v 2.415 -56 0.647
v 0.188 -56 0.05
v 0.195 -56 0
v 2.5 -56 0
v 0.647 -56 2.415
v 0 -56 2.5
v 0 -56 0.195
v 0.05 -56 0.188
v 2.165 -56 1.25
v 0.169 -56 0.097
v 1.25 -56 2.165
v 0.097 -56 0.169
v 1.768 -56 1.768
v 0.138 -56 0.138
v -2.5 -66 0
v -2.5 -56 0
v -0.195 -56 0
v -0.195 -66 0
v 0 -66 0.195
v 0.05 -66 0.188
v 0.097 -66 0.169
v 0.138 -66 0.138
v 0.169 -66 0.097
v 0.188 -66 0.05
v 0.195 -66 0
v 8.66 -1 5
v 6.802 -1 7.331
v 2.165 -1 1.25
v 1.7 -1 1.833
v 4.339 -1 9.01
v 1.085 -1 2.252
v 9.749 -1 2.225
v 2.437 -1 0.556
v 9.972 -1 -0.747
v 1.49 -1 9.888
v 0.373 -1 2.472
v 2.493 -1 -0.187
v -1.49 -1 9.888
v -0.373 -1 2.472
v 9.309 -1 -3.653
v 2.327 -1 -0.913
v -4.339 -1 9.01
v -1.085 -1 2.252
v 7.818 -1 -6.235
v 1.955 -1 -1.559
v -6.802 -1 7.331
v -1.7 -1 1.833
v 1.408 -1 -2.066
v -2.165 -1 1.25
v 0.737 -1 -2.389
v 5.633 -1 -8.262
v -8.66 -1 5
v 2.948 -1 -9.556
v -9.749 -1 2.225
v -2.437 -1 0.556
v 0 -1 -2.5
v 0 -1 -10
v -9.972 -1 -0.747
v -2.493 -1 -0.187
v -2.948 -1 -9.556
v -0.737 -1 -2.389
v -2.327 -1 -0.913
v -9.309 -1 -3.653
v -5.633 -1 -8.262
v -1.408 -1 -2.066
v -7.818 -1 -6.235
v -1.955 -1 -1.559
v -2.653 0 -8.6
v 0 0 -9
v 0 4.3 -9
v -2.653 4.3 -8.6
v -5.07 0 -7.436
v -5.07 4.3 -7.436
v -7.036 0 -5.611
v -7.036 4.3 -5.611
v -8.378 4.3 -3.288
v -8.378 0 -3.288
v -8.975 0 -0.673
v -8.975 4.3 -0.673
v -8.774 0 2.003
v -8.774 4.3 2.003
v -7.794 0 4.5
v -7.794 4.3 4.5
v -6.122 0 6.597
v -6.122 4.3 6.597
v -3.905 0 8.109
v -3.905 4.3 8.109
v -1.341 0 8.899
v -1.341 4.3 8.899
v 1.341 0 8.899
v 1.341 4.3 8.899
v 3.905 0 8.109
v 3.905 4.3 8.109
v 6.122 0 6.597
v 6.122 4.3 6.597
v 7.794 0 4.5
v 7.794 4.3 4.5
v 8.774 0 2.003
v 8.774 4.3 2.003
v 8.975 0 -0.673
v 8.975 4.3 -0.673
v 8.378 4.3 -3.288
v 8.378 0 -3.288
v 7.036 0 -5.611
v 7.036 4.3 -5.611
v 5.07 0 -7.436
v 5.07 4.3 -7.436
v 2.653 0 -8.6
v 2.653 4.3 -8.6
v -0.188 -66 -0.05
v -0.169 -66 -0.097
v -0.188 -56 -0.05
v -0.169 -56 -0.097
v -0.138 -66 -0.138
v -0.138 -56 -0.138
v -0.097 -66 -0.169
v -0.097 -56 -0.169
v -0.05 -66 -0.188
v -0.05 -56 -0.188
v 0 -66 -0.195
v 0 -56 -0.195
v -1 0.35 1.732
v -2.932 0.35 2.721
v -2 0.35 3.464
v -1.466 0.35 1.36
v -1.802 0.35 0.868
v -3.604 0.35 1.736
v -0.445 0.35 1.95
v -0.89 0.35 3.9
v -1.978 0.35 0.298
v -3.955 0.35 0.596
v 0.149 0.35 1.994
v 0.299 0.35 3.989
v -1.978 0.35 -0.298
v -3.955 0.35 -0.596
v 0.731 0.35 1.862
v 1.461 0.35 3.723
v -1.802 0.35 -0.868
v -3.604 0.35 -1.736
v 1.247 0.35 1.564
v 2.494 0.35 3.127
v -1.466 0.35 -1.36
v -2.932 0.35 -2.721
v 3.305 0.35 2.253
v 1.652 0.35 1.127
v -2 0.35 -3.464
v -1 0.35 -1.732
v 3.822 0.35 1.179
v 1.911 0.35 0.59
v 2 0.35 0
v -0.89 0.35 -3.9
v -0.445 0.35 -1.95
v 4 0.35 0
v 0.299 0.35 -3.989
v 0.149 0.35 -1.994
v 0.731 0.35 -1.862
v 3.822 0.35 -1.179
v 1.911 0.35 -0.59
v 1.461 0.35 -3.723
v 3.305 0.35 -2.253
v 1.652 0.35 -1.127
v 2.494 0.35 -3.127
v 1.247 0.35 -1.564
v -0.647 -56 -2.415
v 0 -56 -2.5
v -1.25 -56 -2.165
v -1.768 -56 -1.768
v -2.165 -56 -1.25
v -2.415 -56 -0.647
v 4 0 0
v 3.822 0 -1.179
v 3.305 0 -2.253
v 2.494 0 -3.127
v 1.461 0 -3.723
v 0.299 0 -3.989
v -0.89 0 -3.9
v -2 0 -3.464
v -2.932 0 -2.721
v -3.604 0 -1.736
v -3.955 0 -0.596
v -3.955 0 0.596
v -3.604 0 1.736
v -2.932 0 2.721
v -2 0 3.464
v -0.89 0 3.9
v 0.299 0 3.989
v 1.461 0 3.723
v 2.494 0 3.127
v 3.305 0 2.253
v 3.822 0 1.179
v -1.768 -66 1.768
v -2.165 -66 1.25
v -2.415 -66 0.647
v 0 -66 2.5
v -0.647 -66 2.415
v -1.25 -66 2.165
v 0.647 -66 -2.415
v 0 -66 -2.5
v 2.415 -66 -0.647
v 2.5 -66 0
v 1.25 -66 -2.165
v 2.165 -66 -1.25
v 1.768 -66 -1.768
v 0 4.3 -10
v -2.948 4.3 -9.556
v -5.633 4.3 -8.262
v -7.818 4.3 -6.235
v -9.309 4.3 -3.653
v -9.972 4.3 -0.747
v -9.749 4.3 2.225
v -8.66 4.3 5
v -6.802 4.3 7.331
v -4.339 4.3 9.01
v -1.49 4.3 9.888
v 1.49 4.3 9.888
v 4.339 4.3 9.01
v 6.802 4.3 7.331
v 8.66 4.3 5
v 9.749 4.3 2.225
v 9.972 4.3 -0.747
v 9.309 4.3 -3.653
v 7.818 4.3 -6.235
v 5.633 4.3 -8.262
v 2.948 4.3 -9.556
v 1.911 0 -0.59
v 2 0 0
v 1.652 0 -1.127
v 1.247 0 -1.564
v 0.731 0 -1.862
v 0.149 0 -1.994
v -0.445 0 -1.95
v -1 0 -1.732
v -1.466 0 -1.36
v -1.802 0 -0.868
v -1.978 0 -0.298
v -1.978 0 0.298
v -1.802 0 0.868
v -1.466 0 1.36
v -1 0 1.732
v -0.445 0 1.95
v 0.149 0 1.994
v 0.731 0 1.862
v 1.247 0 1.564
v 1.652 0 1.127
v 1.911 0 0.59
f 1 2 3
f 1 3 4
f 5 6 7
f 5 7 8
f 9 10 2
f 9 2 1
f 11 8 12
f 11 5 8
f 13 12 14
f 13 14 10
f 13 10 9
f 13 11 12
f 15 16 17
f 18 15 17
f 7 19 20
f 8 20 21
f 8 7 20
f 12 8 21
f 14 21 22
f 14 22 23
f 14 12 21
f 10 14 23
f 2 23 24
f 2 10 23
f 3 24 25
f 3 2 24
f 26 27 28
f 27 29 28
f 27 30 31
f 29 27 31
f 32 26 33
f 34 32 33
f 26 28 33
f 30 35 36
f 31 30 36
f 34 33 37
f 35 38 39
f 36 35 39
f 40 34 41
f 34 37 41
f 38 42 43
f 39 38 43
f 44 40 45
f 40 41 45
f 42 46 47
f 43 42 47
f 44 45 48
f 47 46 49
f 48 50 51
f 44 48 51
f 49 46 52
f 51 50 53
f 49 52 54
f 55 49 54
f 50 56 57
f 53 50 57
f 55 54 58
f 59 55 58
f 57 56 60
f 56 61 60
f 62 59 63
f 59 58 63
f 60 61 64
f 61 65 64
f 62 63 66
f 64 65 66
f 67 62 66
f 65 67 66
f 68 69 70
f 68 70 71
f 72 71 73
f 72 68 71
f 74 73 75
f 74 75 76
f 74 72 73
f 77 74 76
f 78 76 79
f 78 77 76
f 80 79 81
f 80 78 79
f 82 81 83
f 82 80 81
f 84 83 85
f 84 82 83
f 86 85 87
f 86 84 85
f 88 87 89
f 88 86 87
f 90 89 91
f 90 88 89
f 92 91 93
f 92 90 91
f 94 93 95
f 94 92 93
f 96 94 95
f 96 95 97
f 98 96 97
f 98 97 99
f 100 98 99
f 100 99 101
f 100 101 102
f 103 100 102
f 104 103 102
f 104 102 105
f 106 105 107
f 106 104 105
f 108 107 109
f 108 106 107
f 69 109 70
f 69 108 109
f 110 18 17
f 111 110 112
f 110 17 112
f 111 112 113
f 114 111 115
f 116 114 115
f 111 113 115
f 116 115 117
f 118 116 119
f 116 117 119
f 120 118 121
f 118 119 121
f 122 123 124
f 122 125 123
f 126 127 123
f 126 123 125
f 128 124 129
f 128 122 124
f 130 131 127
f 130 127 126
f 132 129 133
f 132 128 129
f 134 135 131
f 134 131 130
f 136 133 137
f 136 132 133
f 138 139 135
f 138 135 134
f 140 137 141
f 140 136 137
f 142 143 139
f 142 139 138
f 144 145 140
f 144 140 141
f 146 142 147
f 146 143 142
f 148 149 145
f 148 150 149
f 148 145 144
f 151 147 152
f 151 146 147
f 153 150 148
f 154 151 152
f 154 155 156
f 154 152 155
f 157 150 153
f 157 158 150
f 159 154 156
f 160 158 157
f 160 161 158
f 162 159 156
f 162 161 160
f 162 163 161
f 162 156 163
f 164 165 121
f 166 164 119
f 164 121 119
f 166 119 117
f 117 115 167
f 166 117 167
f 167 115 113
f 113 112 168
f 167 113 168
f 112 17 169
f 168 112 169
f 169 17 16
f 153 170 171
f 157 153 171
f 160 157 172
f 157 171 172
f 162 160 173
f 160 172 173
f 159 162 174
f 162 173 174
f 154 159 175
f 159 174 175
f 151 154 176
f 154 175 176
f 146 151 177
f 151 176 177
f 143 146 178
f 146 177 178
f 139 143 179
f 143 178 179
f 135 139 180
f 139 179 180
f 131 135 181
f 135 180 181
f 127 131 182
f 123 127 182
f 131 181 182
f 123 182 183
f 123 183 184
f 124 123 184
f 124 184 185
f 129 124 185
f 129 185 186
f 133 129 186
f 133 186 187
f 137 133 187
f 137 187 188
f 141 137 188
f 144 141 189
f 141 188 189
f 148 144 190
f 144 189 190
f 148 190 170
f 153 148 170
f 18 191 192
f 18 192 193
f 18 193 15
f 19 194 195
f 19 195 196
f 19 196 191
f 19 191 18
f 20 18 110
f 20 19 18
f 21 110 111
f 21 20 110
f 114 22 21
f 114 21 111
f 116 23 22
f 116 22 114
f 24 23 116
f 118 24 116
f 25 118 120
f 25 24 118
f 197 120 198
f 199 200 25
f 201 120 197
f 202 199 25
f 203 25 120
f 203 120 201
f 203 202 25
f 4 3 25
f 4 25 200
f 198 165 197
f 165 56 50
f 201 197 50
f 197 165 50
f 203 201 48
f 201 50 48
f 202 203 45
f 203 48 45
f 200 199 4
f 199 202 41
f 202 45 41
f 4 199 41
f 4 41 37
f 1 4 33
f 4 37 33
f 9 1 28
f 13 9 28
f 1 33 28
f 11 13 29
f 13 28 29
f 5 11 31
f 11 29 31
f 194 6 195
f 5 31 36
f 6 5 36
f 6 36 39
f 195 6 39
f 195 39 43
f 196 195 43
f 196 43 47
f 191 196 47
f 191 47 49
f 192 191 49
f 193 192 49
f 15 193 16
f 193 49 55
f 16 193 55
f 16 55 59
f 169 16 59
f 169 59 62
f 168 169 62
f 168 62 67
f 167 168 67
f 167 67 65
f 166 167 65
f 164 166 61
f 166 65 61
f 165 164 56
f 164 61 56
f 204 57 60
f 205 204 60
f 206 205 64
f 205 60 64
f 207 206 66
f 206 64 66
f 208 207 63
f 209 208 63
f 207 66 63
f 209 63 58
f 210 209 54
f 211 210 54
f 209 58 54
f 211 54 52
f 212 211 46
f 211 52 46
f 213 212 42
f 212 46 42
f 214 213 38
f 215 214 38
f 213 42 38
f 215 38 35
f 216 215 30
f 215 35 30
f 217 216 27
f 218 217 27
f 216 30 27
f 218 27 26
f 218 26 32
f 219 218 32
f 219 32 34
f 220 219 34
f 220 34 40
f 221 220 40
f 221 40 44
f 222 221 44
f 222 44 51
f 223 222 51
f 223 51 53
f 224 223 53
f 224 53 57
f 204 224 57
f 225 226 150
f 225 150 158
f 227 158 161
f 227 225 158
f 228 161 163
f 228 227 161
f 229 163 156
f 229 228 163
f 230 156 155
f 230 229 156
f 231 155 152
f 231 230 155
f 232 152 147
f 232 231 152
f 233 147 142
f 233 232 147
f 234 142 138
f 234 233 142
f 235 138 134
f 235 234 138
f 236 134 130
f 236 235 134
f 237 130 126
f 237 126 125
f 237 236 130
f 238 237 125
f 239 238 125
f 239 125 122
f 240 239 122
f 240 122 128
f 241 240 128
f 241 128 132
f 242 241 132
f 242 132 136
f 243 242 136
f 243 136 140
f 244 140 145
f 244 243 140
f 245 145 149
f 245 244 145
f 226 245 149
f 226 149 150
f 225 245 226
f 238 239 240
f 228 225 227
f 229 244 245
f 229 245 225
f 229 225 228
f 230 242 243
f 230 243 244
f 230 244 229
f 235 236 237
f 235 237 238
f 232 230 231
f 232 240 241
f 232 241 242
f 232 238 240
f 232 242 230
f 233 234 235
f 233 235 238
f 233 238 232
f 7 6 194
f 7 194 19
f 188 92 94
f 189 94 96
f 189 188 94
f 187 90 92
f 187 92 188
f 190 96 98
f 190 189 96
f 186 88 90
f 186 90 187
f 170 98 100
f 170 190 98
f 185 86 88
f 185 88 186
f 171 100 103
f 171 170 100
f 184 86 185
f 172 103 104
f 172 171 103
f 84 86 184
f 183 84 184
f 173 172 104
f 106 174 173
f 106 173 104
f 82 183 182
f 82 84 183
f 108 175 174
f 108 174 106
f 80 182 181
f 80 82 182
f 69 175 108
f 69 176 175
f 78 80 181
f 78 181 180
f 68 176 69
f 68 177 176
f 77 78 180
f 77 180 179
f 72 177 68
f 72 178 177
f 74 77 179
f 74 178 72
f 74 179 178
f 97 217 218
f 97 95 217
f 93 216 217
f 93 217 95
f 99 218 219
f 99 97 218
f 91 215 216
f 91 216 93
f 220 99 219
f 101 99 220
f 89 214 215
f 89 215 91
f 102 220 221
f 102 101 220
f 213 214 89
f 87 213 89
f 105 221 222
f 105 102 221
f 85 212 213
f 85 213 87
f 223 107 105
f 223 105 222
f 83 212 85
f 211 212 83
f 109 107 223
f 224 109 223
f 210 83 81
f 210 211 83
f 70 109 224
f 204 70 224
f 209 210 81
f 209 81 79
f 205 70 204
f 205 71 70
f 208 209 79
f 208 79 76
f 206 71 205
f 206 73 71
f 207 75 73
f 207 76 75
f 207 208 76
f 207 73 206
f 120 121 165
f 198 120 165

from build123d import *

# Parameters (mm, degrees)
SKETCH1_R           = 10
SKETCH1_R_2         = 9
BOSS_EXTRUDE1_DEPTH = 4.3
BOSS_EXTRUDE2_START = -1
SKETCH1_2_R         = 10
BOSS_EXTRUDE2_DEPTH = 1
SKETCH2_R           = 4
SKETCH2_R_2         = 2
EXTRUDE_THIN1_DEPTH = 0.35
SKETCH3_R           = 2.5
BOSS_EXTRUDE3_DEPTH = 65
CUT_EXTRUDE1_START  = -10
CUT_EXTRUDE1_DEPTH  = 10


with BuildPart() as part:
    # Sketch1 → Boss-Extrude1 (new body)
    with BuildSketch(Plane(origin=(0, 0, 0), x_dir=(1, 0, 0), z_dir=(0, 1, 0))):
        Circle(SKETCH1_R)
        Circle(SKETCH1_R_2, mode=Mode.SUBTRACT)
    extrude(amount=BOSS_EXTRUDE1_DEPTH)

    # Sketch1<2> → Boss-Extrude2 (add)
    with BuildSketch(Plane(origin=(0, 0, 0), x_dir=(1, 0, 0), z_dir=(0, 1, 0)).offset(BOSS_EXTRUDE2_START)):
        Circle(SKETCH1_2_R)
    extrude(amount=BOSS_EXTRUDE2_DEPTH)

    # Sketch2 → Extrude-Thin1 (add)
    with BuildSketch(Plane(origin=(0, 0, 0), x_dir=(1, 0, 0), z_dir=(0, 1, 0))):
        Circle(SKETCH2_R)
        Circle(SKETCH2_R_2, mode=Mode.SUBTRACT)
    extrude(amount=EXTRUDE_THIN1_DEPTH)

    # Sketch3 → Boss-Extrude3 (add)
    with BuildSketch(Plane.XZ.offset(1)):
        Circle(SKETCH3_R)
    extrude(amount=BOSS_EXTRUDE3_DEPTH)

    # Sketch4 → Cut-Extrude1 (cut)
    with BuildSketch(Plane.XZ.offset(66).offset(CUT_EXTRUDE1_START)):
        with BuildLine():
            Line((-2.5, 0), (-0.194982329, 0))
            ThreePointArc((-0.194982329, 0), (-0.137873327, -0.137873327), (0, -0.194982329))
            Line((0, -0.194982329), (0, -2.5))
            ThreePointArc((0, -2.5), (-1.767766953, -1.767766953), (-2.5, 0))
        make_face()
        with BuildLine():
            Line((0, 2.5), (0, 0.194982329))
            ThreePointArc((0, 0.194982329), (0.137873327, 0.137873327), (0.194982329, 0))
            Line((0.194982329, 0), (2.5, 0))
            ThreePointArc((2.5, 0), (1.767766953, 1.767766953), (0, 2.5))
        make_face()
    extrude(amount=CUT_EXTRUDE1_DEPTH, mode=Mode.SUBTRACT)


solid = part.part
